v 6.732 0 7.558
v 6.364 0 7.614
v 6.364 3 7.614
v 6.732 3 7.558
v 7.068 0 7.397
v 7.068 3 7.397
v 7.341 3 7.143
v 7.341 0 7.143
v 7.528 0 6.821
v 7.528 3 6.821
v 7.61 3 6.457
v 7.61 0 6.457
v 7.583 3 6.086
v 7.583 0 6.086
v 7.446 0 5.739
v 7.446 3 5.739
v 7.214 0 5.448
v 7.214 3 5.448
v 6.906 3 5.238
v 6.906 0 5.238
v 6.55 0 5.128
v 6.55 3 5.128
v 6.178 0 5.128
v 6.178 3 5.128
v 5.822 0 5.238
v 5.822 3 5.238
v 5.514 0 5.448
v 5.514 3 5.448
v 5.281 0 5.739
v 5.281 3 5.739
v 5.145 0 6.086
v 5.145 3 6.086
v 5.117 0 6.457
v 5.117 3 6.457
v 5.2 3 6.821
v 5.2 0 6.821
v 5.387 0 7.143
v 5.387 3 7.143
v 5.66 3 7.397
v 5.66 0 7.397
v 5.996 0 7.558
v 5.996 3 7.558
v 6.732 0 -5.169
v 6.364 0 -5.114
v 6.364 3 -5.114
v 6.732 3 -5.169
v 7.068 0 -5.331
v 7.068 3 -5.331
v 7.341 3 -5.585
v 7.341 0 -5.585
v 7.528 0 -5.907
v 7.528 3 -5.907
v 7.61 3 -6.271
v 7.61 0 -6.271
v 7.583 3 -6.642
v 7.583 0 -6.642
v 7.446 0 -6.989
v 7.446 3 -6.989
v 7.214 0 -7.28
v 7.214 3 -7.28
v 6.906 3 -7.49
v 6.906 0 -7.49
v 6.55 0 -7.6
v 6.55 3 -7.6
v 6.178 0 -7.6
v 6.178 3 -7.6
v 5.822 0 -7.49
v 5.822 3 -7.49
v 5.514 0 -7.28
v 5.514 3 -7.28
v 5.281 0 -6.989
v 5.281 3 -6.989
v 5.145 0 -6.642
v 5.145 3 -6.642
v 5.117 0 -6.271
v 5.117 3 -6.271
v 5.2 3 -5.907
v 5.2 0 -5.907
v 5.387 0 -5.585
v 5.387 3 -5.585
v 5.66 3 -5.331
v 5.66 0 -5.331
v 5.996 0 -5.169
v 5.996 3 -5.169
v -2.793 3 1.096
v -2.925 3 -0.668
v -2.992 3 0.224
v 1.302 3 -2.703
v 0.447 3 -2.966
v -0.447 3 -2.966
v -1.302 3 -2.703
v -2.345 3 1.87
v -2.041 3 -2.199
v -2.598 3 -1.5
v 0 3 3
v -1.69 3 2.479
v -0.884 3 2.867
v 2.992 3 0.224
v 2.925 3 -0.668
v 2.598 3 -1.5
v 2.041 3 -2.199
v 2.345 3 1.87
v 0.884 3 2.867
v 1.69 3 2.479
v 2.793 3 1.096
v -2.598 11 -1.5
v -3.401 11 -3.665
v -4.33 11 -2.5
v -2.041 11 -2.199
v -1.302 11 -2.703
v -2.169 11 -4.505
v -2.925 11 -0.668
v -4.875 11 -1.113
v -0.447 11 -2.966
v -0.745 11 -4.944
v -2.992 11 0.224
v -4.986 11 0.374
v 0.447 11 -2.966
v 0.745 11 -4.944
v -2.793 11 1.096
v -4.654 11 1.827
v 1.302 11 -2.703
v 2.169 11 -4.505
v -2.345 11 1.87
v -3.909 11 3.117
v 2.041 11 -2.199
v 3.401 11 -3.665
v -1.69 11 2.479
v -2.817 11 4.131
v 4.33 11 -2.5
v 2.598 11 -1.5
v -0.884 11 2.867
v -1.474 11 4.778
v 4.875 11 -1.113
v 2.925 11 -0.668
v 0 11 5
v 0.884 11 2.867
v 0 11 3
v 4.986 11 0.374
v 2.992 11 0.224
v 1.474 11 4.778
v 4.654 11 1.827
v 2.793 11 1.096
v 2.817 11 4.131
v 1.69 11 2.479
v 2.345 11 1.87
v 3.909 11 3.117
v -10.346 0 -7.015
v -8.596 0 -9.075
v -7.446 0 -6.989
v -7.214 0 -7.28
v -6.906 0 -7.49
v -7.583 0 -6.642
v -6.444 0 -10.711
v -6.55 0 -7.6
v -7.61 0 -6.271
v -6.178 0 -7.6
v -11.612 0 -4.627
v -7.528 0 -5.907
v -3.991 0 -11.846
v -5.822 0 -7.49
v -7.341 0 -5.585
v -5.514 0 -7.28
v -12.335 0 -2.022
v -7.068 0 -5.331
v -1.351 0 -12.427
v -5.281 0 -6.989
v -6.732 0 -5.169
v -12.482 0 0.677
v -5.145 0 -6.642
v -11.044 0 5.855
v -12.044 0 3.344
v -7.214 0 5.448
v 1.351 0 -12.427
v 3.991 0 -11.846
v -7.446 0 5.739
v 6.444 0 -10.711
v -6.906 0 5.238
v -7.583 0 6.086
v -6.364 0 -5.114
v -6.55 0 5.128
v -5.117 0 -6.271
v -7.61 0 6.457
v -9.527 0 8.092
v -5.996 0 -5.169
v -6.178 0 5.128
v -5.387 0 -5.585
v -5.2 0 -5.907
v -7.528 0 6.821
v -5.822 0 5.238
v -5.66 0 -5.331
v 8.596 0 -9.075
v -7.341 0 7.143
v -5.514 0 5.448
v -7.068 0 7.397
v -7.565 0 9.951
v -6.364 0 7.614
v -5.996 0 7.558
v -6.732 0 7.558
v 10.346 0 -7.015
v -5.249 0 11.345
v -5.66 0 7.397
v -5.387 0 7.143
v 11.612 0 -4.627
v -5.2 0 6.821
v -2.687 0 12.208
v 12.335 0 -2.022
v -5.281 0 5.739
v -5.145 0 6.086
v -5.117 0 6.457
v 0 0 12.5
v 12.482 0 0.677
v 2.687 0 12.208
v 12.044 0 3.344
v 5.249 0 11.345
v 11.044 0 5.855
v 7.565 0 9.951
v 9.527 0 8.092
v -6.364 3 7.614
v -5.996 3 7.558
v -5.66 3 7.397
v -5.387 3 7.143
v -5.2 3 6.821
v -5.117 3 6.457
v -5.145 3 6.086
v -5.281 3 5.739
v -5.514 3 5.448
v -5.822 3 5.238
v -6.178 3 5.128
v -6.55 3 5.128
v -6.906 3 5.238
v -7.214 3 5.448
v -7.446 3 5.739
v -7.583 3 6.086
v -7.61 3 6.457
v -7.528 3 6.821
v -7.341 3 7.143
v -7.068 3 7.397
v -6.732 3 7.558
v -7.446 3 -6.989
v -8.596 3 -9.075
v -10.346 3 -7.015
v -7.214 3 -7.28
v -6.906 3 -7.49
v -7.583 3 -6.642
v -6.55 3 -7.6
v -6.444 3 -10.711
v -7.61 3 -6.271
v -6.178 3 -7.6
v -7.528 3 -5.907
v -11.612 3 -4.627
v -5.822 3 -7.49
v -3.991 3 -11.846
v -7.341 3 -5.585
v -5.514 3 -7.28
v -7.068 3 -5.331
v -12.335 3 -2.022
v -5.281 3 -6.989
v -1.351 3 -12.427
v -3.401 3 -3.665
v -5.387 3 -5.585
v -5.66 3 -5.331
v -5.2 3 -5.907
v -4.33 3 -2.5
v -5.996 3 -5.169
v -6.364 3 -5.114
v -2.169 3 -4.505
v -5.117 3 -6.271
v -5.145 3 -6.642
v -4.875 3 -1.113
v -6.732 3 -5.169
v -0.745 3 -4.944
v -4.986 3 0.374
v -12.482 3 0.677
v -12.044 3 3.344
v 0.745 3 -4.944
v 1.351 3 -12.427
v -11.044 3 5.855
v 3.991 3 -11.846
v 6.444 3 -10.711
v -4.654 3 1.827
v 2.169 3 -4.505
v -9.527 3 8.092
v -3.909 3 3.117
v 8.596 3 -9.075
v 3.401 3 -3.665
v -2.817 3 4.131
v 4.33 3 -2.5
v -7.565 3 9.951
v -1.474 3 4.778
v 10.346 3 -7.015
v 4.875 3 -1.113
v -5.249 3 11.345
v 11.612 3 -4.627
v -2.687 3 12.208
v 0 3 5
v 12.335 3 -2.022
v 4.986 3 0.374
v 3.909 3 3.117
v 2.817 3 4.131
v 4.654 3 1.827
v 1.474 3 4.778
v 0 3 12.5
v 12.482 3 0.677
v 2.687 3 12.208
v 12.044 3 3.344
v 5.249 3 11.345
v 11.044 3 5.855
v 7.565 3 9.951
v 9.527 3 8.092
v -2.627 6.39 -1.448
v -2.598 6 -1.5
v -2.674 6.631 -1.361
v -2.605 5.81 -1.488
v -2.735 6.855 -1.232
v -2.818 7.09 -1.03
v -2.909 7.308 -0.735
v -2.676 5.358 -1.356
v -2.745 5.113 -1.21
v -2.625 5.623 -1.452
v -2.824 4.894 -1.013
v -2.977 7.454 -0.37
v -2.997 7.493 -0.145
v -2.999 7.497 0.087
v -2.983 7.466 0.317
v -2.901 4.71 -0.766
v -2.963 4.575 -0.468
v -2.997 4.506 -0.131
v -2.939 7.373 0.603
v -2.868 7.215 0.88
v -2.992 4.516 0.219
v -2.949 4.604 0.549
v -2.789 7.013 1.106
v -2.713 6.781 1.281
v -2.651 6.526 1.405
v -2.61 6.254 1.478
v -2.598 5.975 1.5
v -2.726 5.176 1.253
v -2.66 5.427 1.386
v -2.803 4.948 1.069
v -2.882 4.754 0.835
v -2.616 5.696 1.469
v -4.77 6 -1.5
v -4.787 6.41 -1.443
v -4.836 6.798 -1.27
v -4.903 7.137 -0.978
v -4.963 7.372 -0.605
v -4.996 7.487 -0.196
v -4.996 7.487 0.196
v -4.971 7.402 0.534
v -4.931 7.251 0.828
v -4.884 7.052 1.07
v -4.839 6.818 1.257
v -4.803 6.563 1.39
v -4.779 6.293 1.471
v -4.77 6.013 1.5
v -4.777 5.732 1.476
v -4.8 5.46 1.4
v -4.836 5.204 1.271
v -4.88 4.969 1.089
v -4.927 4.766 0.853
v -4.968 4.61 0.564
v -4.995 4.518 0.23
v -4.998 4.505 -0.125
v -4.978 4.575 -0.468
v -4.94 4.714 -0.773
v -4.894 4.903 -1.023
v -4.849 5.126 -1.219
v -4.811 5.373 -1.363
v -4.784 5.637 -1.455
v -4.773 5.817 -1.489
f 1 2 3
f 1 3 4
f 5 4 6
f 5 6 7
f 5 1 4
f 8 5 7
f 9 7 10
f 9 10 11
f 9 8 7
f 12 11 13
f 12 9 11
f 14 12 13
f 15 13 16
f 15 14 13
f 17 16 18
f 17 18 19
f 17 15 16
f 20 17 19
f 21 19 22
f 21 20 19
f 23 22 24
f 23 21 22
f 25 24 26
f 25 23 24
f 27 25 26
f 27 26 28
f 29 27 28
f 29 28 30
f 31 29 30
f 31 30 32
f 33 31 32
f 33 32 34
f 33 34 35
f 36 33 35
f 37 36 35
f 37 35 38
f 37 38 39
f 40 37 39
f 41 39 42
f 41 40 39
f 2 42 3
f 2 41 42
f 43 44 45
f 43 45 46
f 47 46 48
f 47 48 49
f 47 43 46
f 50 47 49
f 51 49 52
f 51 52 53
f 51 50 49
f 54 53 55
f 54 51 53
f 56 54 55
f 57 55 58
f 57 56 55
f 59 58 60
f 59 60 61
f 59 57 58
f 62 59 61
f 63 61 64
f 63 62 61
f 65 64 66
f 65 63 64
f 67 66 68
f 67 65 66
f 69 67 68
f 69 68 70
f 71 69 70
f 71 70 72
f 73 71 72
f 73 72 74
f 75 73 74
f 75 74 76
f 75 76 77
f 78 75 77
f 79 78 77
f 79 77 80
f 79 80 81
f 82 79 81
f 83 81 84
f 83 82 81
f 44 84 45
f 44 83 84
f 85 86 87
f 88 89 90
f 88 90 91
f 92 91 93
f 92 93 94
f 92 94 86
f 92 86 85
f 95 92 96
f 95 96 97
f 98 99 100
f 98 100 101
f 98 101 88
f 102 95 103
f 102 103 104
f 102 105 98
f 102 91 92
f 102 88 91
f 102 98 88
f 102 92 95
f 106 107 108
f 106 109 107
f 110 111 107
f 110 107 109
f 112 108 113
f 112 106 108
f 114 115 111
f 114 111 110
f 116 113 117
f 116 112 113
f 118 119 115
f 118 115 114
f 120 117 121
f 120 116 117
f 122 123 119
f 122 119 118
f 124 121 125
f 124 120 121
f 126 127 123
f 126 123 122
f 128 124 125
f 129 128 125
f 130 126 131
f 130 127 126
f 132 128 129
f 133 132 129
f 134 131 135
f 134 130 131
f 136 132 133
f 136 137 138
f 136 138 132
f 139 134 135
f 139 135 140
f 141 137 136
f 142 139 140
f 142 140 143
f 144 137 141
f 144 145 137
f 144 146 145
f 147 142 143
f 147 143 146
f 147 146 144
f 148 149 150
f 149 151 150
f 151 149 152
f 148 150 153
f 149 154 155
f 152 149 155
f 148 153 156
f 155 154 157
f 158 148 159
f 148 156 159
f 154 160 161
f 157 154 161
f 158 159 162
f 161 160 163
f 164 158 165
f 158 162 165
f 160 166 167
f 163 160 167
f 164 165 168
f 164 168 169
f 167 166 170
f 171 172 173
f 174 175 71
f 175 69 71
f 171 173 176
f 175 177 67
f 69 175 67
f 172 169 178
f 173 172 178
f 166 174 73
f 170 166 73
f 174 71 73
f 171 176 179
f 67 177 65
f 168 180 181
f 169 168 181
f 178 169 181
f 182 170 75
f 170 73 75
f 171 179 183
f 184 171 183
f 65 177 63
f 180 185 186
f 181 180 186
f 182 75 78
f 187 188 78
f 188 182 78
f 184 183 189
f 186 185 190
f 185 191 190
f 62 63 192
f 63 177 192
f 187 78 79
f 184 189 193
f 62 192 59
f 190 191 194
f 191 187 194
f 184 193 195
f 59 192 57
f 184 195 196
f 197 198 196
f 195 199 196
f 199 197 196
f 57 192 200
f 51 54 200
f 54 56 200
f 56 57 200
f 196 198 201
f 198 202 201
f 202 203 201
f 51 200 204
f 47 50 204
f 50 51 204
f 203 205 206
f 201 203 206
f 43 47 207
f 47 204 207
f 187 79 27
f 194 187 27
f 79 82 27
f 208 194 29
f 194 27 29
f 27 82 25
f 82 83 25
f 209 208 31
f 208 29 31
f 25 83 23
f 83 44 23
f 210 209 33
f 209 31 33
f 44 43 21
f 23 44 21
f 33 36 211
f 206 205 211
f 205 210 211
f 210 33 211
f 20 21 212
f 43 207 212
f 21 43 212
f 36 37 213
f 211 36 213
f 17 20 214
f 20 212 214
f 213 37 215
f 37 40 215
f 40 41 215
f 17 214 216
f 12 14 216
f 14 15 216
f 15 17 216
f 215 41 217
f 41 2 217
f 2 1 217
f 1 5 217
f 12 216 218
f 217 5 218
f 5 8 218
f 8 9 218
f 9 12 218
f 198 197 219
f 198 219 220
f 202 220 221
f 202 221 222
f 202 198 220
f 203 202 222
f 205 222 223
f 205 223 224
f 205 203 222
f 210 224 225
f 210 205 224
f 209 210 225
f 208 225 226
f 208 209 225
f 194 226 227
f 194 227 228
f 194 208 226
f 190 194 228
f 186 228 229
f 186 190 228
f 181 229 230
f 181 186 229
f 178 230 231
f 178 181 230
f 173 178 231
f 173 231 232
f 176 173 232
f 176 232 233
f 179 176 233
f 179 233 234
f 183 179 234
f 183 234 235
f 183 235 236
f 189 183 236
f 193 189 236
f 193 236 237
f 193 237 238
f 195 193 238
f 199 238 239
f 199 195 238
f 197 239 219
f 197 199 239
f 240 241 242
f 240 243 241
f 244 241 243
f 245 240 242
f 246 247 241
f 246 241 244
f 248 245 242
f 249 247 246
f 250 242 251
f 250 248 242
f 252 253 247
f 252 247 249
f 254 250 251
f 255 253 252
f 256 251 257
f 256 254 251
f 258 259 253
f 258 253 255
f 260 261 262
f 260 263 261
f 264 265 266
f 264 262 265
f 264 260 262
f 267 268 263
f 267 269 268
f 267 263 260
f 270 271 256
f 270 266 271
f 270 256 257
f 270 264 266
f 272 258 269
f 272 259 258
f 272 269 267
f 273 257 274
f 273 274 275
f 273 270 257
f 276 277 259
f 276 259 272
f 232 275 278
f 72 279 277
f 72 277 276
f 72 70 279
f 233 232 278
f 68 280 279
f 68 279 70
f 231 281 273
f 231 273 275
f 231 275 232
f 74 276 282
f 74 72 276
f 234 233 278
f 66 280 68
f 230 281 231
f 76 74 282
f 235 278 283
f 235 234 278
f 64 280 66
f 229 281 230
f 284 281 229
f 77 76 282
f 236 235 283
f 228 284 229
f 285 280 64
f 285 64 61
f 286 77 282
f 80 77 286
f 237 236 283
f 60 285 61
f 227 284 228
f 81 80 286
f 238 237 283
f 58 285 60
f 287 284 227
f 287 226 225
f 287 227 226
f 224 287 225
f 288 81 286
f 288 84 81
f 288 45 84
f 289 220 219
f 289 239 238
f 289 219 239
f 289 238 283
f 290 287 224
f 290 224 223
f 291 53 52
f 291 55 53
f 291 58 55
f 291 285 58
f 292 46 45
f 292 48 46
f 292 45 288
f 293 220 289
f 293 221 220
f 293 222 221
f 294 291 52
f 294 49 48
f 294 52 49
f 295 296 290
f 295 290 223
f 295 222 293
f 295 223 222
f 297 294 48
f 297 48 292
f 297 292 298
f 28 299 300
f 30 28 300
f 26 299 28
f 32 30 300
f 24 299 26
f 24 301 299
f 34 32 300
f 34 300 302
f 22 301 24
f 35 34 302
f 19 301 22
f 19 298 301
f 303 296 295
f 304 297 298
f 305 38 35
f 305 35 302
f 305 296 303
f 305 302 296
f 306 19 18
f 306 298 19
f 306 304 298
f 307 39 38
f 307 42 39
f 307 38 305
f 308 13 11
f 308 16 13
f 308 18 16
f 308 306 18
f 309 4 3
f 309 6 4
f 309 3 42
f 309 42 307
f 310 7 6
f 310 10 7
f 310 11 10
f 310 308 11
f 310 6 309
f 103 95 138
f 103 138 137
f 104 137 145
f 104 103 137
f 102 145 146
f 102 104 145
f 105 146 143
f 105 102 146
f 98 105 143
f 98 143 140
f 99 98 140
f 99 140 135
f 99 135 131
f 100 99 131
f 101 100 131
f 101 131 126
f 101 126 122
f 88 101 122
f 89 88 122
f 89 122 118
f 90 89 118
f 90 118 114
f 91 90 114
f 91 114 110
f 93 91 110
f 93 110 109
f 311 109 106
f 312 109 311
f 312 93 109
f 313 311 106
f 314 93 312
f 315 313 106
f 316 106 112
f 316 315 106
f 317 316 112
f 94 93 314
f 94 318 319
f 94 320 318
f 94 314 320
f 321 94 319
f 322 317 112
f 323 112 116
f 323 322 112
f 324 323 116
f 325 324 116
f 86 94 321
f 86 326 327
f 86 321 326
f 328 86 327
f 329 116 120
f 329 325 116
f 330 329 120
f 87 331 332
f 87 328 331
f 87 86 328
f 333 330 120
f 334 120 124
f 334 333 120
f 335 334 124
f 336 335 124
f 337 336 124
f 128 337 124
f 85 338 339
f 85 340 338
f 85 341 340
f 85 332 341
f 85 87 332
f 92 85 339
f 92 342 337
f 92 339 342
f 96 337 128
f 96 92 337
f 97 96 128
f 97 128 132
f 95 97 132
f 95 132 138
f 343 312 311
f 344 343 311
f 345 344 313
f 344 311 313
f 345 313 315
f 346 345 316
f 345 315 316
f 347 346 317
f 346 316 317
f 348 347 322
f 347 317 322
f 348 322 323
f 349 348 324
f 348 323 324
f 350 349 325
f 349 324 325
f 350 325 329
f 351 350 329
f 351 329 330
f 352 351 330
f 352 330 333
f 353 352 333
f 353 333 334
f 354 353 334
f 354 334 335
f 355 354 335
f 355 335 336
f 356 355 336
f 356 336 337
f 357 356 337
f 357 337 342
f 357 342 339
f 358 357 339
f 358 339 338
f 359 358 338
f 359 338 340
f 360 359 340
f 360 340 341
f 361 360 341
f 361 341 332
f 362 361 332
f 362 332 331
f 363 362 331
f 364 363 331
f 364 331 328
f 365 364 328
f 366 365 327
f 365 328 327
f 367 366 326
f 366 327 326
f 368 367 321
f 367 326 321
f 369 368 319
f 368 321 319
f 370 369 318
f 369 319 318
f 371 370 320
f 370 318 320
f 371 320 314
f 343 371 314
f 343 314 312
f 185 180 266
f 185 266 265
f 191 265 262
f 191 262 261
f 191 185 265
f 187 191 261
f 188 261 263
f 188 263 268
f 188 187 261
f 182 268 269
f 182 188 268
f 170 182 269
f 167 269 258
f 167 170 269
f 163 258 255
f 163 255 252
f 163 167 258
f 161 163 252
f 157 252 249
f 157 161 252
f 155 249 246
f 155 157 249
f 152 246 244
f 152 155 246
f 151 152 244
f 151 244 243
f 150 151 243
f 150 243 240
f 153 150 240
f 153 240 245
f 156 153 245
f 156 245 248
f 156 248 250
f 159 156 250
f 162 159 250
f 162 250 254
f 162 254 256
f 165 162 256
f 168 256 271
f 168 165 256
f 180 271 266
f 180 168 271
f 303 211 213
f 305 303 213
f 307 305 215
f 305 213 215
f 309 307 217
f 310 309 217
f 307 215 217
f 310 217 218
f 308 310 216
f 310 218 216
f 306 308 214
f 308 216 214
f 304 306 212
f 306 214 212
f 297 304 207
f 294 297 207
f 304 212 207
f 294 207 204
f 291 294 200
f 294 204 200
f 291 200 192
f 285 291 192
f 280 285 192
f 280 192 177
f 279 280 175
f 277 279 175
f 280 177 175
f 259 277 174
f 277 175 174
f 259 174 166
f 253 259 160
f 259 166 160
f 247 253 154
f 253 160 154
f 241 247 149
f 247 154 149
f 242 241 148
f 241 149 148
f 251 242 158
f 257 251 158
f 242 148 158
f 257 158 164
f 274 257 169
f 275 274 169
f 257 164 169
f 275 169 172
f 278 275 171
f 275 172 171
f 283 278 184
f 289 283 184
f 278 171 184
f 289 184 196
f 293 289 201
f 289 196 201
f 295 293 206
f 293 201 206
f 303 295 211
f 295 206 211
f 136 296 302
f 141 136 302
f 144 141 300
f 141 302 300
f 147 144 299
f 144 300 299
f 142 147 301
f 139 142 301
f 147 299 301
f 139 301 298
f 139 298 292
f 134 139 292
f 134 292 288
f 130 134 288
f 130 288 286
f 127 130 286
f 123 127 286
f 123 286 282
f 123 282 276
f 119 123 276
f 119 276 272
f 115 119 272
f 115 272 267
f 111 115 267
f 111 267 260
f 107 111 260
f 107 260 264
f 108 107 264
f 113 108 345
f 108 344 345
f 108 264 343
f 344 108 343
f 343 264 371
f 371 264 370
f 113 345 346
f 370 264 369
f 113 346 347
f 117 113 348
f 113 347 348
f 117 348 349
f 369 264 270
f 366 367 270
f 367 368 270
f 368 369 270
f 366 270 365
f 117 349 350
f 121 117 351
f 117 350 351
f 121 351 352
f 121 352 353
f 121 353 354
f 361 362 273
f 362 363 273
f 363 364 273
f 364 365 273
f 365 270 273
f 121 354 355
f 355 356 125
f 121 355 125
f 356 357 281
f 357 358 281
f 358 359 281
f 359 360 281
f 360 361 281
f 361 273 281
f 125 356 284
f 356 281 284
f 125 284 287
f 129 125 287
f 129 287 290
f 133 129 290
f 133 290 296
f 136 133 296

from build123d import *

# Parameters (mm, degrees)
CROQUIS1_R              = 12.5
CROQUIS1_R_2            = 1.25
SALIENTE_EXTRUIR1_DEPTH = 3
SALIENTE_EXTRUIR2_START = 3
CROQUIS1_3_R            = 5
CROQUIS1_3_R_2          = 3
SALIENTE_EXTRUIR2_DEPTH = 8
CROQUIS2_R              = 1.5
CORTAR_EXTRUIR1_DEPTH   = 21.820662814


with BuildPart() as part:
    # Croquis1 → Saliente-Extruir1 (new body)
    with BuildSketch(Plane(origin=(0, 0, 0), x_dir=(1, 0, 0), z_dir=(0, 1, 0))):
        with Locations(Location((0, 0, 0), (0, 0, 270))):
            Circle(CROQUIS1_R)
        with Locations(Location((-6.363961031, 6.363961031, 0), (0, 0, 270))):
            Circle(CROQUIS1_R_2, mode=Mode.SUBTRACT)
        with Locations(Location((6.363961031, 6.363961031, 0), (0, 0, 270))):
            Circle(CROQUIS1_R_2, mode=Mode.SUBTRACT)
        with Locations(Location((6.363961031, -6.363961031, 0), (0, 0, 270))):
            Circle(CROQUIS1_R_2, mode=Mode.SUBTRACT)
        with Locations(Location((-6.363961031, -6.363961031, 0), (0, 0, 270))):
            Circle(CROQUIS1_R_2, mode=Mode.SUBTRACT)
    extrude(amount=SALIENTE_EXTRUIR1_DEPTH)

    # Croquis1<3> → Saliente-Extruir2 (add)
    with BuildSketch(Plane(origin=(0, 0, 0), x_dir=(1, 0, 0), z_dir=(0, 1, 0)).offset(SALIENTE_EXTRUIR2_START)):
        with Locations(Location((0, 0, 0), (0, 0, 270))):
            Circle(CROQUIS1_3_R)
        with Locations(Location((0, 0, 0), (0, 0, 270))):
            Circle(CROQUIS1_3_R_2, mode=Mode.SUBTRACT)
    extrude(amount=SALIENTE_EXTRUIR2_DEPTH)

    # Croquis2 → Cortar-Extruir1 (cut, through all)
    with BuildSketch(Plane(origin=(0, 0, 0), x_dir=(0, 0, -1), z_dir=(1, 0, 0))):
        with Locations((0, 6)):
            Circle(CROQUIS2_R)
    extrude(amount=-CORTAR_EXTRUIR1_DEPTH, mode=Mode.SUBTRACT)


solid = part.part
